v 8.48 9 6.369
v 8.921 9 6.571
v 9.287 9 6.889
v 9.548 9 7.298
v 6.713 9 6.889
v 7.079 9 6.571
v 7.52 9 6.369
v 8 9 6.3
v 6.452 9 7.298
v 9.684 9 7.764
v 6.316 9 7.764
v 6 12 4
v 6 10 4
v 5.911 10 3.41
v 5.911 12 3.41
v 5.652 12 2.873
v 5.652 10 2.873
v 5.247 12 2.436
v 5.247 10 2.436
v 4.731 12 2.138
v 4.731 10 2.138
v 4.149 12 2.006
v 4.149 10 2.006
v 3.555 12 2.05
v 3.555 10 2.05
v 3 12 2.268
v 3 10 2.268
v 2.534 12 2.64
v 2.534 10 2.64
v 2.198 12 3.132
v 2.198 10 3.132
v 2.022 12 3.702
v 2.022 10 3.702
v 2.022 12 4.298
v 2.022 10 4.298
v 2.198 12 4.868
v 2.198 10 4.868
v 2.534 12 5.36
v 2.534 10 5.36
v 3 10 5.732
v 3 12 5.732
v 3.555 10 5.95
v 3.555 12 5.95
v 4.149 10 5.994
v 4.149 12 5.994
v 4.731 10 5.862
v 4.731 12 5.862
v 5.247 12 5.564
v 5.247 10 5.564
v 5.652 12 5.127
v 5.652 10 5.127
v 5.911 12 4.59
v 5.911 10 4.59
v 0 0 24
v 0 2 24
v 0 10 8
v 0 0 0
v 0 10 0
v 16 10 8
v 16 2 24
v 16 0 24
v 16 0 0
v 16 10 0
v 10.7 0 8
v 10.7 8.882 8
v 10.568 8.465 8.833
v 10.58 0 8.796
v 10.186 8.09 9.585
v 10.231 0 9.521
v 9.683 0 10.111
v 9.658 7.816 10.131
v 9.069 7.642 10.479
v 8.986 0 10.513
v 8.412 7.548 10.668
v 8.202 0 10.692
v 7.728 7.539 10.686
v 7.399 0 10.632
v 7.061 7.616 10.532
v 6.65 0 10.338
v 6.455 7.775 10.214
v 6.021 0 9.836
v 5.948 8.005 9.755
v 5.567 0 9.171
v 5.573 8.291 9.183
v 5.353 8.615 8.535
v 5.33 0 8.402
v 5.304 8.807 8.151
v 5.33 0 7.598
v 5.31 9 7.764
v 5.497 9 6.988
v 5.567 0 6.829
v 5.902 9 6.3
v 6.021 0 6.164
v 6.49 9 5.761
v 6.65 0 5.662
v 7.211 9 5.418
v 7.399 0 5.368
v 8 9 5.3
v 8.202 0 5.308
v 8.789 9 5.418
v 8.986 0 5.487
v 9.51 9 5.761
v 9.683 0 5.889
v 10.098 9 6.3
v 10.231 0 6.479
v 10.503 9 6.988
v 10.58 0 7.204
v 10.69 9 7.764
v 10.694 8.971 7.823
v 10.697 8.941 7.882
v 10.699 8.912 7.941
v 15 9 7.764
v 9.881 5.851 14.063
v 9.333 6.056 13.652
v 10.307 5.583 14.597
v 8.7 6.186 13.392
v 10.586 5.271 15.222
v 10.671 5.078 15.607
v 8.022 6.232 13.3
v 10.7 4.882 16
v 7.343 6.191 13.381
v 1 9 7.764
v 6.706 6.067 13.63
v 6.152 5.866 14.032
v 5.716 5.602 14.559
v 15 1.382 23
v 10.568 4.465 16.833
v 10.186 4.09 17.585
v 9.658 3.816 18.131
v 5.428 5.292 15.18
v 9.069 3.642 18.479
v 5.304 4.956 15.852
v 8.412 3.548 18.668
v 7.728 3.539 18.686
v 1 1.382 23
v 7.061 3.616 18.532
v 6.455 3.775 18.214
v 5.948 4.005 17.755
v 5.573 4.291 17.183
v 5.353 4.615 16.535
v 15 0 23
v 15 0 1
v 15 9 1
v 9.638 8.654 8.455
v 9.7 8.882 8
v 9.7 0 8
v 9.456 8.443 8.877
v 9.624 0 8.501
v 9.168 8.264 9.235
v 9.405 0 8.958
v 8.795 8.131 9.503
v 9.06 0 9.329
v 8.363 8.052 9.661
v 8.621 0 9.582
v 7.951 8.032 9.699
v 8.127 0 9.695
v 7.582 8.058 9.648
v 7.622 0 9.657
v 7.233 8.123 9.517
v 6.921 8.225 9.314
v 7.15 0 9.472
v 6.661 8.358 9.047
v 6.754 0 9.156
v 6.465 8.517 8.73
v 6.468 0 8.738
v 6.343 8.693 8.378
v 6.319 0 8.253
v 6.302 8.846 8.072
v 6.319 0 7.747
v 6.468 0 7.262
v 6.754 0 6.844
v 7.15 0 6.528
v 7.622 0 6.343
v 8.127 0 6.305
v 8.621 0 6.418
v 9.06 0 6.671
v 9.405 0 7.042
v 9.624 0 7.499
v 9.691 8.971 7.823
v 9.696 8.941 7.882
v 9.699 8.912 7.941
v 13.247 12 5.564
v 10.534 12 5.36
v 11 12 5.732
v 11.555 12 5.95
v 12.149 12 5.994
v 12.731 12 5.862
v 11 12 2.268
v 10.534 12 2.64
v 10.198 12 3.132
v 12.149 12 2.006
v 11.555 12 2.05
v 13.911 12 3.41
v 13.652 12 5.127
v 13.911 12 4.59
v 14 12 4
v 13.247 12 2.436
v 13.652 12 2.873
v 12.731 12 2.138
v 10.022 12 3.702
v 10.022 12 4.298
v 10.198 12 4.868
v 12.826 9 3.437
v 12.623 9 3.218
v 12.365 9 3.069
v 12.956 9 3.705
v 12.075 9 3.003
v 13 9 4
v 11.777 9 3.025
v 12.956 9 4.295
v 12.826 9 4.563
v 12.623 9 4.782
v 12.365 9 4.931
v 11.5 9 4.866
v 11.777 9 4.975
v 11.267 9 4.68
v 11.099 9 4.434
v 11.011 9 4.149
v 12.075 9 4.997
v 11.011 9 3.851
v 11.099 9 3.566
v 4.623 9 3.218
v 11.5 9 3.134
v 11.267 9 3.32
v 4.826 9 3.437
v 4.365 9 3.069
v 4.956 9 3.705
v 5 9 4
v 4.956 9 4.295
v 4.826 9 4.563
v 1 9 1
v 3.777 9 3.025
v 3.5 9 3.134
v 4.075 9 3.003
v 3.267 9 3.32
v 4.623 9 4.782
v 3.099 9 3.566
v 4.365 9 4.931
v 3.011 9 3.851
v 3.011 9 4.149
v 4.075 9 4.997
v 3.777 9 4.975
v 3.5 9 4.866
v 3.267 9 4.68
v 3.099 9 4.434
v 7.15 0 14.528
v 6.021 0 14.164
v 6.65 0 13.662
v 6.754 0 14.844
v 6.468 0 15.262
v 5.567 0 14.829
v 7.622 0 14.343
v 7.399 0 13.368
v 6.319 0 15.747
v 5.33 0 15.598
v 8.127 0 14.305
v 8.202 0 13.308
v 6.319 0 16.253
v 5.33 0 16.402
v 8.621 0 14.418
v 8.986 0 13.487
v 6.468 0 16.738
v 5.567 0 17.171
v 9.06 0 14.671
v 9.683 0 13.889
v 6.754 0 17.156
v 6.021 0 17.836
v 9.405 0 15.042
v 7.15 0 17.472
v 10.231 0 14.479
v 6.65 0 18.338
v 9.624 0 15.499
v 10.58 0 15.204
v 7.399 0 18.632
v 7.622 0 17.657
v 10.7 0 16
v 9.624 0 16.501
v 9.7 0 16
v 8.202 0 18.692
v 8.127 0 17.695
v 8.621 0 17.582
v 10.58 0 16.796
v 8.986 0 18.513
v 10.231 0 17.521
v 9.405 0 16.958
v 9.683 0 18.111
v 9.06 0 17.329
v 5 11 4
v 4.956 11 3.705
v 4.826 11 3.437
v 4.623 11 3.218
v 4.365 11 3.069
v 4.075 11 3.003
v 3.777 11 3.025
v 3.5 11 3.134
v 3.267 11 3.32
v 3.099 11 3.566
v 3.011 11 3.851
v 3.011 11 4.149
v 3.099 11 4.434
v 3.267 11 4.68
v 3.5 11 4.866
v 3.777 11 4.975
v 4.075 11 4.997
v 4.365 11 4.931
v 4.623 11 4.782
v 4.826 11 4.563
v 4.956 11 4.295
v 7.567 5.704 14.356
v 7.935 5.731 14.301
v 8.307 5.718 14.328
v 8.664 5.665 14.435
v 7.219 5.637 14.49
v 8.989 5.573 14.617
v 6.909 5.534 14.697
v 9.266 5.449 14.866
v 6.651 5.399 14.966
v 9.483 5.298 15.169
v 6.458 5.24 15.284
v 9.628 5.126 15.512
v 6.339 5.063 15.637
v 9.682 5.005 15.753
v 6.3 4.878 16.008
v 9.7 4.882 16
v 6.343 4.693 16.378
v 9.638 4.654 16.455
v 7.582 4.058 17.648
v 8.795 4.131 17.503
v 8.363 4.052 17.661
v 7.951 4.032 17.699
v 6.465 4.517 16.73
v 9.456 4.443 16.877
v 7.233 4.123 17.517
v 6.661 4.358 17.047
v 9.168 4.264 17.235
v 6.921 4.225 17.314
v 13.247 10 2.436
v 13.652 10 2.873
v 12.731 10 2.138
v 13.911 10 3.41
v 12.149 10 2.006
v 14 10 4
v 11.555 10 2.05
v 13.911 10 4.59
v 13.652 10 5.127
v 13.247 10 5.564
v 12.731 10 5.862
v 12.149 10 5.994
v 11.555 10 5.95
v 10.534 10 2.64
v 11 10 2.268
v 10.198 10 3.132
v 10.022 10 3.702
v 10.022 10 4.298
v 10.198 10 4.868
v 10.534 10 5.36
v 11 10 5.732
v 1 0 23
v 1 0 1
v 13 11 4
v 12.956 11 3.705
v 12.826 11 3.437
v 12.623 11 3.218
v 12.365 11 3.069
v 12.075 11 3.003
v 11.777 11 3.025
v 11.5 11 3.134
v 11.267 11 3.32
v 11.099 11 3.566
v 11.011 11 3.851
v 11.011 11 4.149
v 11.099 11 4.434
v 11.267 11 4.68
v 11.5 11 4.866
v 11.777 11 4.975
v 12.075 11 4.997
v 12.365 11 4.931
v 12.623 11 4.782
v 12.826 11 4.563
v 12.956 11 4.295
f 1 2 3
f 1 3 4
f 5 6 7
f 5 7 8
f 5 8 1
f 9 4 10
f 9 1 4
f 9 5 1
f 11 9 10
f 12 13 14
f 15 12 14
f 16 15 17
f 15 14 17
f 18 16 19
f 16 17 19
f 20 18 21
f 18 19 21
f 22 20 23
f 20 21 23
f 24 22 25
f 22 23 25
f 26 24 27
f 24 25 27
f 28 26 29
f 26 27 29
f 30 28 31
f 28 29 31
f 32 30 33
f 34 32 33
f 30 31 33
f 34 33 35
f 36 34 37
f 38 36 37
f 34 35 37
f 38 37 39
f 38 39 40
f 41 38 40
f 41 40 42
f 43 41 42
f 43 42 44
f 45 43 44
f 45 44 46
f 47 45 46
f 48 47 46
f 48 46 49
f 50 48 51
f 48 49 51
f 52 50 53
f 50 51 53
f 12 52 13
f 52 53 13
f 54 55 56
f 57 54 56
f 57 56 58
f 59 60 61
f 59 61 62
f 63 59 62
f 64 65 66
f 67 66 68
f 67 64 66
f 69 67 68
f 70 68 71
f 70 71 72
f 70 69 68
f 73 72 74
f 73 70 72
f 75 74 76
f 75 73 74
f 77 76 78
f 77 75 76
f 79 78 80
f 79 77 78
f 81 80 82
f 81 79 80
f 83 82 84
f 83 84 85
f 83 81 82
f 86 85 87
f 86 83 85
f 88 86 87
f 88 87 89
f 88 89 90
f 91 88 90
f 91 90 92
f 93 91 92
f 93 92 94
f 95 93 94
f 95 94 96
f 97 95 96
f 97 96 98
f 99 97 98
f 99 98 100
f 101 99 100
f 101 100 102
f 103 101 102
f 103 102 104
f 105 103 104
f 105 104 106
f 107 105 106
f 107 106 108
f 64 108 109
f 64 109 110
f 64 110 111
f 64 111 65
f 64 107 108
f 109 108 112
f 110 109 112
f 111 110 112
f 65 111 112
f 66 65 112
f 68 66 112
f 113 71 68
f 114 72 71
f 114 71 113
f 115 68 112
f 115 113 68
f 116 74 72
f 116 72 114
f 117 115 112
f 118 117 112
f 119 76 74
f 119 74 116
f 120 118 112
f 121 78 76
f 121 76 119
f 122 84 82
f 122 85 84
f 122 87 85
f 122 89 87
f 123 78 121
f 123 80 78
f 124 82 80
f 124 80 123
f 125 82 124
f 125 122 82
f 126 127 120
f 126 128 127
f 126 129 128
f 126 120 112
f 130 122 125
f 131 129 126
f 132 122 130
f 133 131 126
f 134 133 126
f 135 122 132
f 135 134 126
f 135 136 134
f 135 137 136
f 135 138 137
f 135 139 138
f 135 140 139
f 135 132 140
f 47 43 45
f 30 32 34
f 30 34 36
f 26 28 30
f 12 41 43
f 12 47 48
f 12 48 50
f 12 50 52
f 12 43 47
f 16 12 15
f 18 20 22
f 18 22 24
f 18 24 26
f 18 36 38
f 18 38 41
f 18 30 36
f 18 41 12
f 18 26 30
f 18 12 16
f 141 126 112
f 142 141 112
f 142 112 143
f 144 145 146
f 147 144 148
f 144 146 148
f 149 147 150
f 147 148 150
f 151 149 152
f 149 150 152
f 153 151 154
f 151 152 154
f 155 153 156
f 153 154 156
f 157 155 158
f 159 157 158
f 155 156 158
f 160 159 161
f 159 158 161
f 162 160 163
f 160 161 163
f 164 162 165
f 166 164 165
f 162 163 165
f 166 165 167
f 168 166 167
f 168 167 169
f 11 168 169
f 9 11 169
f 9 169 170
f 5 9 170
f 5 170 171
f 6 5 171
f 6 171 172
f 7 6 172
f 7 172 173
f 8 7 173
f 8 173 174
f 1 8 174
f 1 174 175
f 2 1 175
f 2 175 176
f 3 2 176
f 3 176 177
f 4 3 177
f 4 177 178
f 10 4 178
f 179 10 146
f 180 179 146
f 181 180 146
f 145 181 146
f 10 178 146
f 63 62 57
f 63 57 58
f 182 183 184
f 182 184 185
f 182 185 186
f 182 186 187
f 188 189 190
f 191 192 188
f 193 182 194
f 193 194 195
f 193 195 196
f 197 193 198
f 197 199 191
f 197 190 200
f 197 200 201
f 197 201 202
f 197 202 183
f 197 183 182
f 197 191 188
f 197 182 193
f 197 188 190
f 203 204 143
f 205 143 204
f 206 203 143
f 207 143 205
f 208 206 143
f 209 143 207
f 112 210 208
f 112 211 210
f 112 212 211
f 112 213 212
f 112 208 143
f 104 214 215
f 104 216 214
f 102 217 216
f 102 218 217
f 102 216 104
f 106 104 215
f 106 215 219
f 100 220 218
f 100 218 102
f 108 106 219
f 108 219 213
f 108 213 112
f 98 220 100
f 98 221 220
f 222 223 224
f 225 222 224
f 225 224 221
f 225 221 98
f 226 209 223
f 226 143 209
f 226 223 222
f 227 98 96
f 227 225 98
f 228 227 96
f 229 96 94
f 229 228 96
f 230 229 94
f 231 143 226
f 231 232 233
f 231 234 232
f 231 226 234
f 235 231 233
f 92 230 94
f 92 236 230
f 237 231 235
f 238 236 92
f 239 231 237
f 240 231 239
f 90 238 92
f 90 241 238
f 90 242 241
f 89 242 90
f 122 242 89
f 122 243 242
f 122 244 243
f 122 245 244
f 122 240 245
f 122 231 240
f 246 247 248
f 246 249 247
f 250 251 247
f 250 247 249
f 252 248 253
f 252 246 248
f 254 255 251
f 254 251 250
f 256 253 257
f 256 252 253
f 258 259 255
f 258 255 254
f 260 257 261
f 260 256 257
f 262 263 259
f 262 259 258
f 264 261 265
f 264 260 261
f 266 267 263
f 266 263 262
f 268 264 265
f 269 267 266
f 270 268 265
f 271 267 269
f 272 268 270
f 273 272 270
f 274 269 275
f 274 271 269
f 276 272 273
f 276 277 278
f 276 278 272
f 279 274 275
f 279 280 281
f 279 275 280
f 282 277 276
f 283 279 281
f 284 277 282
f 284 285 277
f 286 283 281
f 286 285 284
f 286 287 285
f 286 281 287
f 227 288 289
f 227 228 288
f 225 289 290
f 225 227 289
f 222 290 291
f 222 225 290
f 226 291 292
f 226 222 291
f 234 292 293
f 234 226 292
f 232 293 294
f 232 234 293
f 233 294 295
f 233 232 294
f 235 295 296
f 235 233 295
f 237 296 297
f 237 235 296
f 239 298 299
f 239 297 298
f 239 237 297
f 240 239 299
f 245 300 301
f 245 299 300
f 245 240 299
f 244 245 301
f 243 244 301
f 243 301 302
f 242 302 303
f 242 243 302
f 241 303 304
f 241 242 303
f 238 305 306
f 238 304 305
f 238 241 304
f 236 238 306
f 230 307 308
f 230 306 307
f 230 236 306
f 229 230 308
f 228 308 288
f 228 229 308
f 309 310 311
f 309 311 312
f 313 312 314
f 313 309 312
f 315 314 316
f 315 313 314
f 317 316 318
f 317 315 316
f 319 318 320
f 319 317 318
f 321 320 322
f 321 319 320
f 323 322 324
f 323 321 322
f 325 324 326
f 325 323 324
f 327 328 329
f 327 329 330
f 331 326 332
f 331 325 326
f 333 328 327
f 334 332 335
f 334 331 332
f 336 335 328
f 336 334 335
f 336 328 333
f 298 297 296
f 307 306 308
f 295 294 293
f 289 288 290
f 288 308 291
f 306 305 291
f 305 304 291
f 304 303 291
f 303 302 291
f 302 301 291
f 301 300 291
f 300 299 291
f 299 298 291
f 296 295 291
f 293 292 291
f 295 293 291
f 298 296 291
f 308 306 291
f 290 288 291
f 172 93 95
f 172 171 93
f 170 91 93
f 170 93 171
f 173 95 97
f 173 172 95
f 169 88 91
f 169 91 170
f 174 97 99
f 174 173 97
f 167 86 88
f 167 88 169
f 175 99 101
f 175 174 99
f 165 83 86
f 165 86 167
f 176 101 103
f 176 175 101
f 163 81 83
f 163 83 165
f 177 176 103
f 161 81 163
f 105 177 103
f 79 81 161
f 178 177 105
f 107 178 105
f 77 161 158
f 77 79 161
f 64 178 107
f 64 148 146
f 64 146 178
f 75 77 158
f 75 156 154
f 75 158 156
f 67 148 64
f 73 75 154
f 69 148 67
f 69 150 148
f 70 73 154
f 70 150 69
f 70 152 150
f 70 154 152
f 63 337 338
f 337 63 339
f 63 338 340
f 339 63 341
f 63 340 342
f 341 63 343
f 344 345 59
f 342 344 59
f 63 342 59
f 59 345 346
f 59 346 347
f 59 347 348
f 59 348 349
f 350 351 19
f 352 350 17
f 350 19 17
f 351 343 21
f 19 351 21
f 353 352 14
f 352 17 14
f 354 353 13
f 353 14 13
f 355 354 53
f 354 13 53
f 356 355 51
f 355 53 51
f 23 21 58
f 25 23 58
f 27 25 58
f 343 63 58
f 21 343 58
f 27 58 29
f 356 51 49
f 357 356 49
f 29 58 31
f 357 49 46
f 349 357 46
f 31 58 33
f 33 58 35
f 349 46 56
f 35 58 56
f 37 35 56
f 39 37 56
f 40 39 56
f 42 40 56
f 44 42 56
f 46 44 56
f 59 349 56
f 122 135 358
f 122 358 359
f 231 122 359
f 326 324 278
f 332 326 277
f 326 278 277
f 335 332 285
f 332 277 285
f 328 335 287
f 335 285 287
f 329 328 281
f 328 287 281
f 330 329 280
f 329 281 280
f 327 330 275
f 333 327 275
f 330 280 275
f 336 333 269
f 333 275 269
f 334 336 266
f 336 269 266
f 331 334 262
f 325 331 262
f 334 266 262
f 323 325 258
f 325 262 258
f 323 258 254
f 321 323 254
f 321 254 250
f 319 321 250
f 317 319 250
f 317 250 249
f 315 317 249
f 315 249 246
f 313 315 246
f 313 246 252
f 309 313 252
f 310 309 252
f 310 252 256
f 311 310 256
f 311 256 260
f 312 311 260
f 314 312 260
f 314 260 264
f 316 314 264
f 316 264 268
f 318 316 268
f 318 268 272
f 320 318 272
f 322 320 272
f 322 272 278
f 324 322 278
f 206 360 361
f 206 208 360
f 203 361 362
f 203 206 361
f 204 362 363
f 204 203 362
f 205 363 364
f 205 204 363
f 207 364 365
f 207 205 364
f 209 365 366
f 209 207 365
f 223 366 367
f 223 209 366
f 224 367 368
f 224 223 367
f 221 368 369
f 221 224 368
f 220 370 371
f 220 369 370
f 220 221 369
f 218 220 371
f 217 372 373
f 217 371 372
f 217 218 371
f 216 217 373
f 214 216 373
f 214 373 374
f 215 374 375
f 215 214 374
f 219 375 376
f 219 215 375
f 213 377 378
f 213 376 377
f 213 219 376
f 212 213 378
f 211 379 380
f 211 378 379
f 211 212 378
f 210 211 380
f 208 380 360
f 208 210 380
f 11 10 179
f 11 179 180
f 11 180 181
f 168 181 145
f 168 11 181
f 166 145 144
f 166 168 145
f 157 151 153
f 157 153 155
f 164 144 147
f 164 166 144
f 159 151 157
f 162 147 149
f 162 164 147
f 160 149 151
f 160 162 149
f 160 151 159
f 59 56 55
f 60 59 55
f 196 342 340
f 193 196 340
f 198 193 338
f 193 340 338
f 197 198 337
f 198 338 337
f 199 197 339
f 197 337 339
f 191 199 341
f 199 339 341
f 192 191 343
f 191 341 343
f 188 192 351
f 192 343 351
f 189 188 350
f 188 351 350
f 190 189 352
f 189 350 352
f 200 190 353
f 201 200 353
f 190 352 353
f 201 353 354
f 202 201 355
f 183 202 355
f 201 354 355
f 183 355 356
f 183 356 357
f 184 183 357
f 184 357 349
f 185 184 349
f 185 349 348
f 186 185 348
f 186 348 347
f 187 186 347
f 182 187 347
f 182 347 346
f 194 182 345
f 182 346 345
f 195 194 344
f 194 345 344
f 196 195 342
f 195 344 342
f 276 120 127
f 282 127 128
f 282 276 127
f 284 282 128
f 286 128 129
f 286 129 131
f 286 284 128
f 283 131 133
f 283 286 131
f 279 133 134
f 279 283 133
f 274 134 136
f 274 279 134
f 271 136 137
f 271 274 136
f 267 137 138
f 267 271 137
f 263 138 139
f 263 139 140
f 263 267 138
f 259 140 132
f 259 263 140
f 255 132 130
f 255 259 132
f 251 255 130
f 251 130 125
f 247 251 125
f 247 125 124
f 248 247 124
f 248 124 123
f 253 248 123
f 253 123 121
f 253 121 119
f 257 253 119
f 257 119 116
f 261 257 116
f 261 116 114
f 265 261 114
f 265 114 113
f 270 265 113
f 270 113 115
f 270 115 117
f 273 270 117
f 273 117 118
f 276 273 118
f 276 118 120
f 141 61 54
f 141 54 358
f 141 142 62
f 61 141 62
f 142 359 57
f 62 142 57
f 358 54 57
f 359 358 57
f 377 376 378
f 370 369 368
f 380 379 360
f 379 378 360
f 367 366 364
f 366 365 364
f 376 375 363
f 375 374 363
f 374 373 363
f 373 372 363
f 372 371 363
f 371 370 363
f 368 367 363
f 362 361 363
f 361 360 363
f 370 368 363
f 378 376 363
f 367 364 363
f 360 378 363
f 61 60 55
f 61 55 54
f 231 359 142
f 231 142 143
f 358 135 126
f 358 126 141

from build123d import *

# Parameters (mm, degrees)
BOSS_EXTRUDE1_DEPTH = 16
SKETCH2_R           = 2
BOSS_EXTRUDE2_DEPTH = 2
SHELL1_T            = -1
BOSS_EXTRUDE3_REACH = 14
SKETCH3_R           = 2.7
SKETCH3_R_2         = 1.7


with BuildPart() as part:
    # Sketch1 → Boss-Extrude1 (new body)
    with BuildSketch(Plane(origin=(0, 0, 0), x_dir=(0, 0, -1), z_dir=(1, 0, 0))):
        Polygon((0, 0), (0, 10), (-8, 10), (-24, 2), (-24, 0), align=None)
    extrude(amount=BOSS_EXTRUDE1_DEPTH)

    # Sketch2 → Boss-Extrude2 (add)
    with BuildSketch(Plane(origin=(0, 10, 0), x_dir=(1, 0, 0), z_dir=(0, 1, 0))):
        with Locations((4, -4)):
            Circle(SKETCH2_R)
        with Locations((12, -4)):
            Circle(SKETCH2_R)
    extrude(amount=BOSS_EXTRUDE2_DEPTH)

    # Shell1
    shell1_openings = [part.faces().sort_by_distance(p)[0] for p in [
        (8, 0, 12),
    ]]
    offset(amount=SHELL1_T, openings=shell1_openings, kind=Kind.INTERSECTION)

    # Sketch3 → Boss-Extrude3 (add, up to next)
    with BuildSketch(Plane.XZ, mode=Mode.PRIVATE) as boss_extrude3_sk1:
        with Locations((8, 8)):
            Circle(SKETCH3_R)
        with Locations((8, 8)):
            Circle(SKETCH3_R_2, mode=Mode.SUBTRACT)
    boss_extrude3_tool1 = extrude(boss_extrude3_sk1.sketch, amount=-BOSS_EXTRUDE3_REACH, mode=Mode.PRIVATE) - part.part
    add(boss_extrude3_tool1.solids().sort_by_distance((5.376368, 0, 8))[0])
    # Sketch3 → Boss-Extrude3 (add, up to next)
    with BuildSketch(Plane.XZ, mode=Mode.PRIVATE) as boss_extrude3_sk2:
        with Locations((8, 16)):
            Circle(SKETCH3_R)
        with Locations((8, 16)):
            Circle(SKETCH3_R_2, mode=Mode.SUBTRACT)
    boss_extrude3_tool2 = extrude(boss_extrude3_sk2.sketch, amount=-BOSS_EXTRUDE3_REACH, mode=Mode.PRIVATE) - part.part
    add(boss_extrude3_tool2.solids().sort_by_distance((5.376368, 0, 16))[0])


solid = part.part
